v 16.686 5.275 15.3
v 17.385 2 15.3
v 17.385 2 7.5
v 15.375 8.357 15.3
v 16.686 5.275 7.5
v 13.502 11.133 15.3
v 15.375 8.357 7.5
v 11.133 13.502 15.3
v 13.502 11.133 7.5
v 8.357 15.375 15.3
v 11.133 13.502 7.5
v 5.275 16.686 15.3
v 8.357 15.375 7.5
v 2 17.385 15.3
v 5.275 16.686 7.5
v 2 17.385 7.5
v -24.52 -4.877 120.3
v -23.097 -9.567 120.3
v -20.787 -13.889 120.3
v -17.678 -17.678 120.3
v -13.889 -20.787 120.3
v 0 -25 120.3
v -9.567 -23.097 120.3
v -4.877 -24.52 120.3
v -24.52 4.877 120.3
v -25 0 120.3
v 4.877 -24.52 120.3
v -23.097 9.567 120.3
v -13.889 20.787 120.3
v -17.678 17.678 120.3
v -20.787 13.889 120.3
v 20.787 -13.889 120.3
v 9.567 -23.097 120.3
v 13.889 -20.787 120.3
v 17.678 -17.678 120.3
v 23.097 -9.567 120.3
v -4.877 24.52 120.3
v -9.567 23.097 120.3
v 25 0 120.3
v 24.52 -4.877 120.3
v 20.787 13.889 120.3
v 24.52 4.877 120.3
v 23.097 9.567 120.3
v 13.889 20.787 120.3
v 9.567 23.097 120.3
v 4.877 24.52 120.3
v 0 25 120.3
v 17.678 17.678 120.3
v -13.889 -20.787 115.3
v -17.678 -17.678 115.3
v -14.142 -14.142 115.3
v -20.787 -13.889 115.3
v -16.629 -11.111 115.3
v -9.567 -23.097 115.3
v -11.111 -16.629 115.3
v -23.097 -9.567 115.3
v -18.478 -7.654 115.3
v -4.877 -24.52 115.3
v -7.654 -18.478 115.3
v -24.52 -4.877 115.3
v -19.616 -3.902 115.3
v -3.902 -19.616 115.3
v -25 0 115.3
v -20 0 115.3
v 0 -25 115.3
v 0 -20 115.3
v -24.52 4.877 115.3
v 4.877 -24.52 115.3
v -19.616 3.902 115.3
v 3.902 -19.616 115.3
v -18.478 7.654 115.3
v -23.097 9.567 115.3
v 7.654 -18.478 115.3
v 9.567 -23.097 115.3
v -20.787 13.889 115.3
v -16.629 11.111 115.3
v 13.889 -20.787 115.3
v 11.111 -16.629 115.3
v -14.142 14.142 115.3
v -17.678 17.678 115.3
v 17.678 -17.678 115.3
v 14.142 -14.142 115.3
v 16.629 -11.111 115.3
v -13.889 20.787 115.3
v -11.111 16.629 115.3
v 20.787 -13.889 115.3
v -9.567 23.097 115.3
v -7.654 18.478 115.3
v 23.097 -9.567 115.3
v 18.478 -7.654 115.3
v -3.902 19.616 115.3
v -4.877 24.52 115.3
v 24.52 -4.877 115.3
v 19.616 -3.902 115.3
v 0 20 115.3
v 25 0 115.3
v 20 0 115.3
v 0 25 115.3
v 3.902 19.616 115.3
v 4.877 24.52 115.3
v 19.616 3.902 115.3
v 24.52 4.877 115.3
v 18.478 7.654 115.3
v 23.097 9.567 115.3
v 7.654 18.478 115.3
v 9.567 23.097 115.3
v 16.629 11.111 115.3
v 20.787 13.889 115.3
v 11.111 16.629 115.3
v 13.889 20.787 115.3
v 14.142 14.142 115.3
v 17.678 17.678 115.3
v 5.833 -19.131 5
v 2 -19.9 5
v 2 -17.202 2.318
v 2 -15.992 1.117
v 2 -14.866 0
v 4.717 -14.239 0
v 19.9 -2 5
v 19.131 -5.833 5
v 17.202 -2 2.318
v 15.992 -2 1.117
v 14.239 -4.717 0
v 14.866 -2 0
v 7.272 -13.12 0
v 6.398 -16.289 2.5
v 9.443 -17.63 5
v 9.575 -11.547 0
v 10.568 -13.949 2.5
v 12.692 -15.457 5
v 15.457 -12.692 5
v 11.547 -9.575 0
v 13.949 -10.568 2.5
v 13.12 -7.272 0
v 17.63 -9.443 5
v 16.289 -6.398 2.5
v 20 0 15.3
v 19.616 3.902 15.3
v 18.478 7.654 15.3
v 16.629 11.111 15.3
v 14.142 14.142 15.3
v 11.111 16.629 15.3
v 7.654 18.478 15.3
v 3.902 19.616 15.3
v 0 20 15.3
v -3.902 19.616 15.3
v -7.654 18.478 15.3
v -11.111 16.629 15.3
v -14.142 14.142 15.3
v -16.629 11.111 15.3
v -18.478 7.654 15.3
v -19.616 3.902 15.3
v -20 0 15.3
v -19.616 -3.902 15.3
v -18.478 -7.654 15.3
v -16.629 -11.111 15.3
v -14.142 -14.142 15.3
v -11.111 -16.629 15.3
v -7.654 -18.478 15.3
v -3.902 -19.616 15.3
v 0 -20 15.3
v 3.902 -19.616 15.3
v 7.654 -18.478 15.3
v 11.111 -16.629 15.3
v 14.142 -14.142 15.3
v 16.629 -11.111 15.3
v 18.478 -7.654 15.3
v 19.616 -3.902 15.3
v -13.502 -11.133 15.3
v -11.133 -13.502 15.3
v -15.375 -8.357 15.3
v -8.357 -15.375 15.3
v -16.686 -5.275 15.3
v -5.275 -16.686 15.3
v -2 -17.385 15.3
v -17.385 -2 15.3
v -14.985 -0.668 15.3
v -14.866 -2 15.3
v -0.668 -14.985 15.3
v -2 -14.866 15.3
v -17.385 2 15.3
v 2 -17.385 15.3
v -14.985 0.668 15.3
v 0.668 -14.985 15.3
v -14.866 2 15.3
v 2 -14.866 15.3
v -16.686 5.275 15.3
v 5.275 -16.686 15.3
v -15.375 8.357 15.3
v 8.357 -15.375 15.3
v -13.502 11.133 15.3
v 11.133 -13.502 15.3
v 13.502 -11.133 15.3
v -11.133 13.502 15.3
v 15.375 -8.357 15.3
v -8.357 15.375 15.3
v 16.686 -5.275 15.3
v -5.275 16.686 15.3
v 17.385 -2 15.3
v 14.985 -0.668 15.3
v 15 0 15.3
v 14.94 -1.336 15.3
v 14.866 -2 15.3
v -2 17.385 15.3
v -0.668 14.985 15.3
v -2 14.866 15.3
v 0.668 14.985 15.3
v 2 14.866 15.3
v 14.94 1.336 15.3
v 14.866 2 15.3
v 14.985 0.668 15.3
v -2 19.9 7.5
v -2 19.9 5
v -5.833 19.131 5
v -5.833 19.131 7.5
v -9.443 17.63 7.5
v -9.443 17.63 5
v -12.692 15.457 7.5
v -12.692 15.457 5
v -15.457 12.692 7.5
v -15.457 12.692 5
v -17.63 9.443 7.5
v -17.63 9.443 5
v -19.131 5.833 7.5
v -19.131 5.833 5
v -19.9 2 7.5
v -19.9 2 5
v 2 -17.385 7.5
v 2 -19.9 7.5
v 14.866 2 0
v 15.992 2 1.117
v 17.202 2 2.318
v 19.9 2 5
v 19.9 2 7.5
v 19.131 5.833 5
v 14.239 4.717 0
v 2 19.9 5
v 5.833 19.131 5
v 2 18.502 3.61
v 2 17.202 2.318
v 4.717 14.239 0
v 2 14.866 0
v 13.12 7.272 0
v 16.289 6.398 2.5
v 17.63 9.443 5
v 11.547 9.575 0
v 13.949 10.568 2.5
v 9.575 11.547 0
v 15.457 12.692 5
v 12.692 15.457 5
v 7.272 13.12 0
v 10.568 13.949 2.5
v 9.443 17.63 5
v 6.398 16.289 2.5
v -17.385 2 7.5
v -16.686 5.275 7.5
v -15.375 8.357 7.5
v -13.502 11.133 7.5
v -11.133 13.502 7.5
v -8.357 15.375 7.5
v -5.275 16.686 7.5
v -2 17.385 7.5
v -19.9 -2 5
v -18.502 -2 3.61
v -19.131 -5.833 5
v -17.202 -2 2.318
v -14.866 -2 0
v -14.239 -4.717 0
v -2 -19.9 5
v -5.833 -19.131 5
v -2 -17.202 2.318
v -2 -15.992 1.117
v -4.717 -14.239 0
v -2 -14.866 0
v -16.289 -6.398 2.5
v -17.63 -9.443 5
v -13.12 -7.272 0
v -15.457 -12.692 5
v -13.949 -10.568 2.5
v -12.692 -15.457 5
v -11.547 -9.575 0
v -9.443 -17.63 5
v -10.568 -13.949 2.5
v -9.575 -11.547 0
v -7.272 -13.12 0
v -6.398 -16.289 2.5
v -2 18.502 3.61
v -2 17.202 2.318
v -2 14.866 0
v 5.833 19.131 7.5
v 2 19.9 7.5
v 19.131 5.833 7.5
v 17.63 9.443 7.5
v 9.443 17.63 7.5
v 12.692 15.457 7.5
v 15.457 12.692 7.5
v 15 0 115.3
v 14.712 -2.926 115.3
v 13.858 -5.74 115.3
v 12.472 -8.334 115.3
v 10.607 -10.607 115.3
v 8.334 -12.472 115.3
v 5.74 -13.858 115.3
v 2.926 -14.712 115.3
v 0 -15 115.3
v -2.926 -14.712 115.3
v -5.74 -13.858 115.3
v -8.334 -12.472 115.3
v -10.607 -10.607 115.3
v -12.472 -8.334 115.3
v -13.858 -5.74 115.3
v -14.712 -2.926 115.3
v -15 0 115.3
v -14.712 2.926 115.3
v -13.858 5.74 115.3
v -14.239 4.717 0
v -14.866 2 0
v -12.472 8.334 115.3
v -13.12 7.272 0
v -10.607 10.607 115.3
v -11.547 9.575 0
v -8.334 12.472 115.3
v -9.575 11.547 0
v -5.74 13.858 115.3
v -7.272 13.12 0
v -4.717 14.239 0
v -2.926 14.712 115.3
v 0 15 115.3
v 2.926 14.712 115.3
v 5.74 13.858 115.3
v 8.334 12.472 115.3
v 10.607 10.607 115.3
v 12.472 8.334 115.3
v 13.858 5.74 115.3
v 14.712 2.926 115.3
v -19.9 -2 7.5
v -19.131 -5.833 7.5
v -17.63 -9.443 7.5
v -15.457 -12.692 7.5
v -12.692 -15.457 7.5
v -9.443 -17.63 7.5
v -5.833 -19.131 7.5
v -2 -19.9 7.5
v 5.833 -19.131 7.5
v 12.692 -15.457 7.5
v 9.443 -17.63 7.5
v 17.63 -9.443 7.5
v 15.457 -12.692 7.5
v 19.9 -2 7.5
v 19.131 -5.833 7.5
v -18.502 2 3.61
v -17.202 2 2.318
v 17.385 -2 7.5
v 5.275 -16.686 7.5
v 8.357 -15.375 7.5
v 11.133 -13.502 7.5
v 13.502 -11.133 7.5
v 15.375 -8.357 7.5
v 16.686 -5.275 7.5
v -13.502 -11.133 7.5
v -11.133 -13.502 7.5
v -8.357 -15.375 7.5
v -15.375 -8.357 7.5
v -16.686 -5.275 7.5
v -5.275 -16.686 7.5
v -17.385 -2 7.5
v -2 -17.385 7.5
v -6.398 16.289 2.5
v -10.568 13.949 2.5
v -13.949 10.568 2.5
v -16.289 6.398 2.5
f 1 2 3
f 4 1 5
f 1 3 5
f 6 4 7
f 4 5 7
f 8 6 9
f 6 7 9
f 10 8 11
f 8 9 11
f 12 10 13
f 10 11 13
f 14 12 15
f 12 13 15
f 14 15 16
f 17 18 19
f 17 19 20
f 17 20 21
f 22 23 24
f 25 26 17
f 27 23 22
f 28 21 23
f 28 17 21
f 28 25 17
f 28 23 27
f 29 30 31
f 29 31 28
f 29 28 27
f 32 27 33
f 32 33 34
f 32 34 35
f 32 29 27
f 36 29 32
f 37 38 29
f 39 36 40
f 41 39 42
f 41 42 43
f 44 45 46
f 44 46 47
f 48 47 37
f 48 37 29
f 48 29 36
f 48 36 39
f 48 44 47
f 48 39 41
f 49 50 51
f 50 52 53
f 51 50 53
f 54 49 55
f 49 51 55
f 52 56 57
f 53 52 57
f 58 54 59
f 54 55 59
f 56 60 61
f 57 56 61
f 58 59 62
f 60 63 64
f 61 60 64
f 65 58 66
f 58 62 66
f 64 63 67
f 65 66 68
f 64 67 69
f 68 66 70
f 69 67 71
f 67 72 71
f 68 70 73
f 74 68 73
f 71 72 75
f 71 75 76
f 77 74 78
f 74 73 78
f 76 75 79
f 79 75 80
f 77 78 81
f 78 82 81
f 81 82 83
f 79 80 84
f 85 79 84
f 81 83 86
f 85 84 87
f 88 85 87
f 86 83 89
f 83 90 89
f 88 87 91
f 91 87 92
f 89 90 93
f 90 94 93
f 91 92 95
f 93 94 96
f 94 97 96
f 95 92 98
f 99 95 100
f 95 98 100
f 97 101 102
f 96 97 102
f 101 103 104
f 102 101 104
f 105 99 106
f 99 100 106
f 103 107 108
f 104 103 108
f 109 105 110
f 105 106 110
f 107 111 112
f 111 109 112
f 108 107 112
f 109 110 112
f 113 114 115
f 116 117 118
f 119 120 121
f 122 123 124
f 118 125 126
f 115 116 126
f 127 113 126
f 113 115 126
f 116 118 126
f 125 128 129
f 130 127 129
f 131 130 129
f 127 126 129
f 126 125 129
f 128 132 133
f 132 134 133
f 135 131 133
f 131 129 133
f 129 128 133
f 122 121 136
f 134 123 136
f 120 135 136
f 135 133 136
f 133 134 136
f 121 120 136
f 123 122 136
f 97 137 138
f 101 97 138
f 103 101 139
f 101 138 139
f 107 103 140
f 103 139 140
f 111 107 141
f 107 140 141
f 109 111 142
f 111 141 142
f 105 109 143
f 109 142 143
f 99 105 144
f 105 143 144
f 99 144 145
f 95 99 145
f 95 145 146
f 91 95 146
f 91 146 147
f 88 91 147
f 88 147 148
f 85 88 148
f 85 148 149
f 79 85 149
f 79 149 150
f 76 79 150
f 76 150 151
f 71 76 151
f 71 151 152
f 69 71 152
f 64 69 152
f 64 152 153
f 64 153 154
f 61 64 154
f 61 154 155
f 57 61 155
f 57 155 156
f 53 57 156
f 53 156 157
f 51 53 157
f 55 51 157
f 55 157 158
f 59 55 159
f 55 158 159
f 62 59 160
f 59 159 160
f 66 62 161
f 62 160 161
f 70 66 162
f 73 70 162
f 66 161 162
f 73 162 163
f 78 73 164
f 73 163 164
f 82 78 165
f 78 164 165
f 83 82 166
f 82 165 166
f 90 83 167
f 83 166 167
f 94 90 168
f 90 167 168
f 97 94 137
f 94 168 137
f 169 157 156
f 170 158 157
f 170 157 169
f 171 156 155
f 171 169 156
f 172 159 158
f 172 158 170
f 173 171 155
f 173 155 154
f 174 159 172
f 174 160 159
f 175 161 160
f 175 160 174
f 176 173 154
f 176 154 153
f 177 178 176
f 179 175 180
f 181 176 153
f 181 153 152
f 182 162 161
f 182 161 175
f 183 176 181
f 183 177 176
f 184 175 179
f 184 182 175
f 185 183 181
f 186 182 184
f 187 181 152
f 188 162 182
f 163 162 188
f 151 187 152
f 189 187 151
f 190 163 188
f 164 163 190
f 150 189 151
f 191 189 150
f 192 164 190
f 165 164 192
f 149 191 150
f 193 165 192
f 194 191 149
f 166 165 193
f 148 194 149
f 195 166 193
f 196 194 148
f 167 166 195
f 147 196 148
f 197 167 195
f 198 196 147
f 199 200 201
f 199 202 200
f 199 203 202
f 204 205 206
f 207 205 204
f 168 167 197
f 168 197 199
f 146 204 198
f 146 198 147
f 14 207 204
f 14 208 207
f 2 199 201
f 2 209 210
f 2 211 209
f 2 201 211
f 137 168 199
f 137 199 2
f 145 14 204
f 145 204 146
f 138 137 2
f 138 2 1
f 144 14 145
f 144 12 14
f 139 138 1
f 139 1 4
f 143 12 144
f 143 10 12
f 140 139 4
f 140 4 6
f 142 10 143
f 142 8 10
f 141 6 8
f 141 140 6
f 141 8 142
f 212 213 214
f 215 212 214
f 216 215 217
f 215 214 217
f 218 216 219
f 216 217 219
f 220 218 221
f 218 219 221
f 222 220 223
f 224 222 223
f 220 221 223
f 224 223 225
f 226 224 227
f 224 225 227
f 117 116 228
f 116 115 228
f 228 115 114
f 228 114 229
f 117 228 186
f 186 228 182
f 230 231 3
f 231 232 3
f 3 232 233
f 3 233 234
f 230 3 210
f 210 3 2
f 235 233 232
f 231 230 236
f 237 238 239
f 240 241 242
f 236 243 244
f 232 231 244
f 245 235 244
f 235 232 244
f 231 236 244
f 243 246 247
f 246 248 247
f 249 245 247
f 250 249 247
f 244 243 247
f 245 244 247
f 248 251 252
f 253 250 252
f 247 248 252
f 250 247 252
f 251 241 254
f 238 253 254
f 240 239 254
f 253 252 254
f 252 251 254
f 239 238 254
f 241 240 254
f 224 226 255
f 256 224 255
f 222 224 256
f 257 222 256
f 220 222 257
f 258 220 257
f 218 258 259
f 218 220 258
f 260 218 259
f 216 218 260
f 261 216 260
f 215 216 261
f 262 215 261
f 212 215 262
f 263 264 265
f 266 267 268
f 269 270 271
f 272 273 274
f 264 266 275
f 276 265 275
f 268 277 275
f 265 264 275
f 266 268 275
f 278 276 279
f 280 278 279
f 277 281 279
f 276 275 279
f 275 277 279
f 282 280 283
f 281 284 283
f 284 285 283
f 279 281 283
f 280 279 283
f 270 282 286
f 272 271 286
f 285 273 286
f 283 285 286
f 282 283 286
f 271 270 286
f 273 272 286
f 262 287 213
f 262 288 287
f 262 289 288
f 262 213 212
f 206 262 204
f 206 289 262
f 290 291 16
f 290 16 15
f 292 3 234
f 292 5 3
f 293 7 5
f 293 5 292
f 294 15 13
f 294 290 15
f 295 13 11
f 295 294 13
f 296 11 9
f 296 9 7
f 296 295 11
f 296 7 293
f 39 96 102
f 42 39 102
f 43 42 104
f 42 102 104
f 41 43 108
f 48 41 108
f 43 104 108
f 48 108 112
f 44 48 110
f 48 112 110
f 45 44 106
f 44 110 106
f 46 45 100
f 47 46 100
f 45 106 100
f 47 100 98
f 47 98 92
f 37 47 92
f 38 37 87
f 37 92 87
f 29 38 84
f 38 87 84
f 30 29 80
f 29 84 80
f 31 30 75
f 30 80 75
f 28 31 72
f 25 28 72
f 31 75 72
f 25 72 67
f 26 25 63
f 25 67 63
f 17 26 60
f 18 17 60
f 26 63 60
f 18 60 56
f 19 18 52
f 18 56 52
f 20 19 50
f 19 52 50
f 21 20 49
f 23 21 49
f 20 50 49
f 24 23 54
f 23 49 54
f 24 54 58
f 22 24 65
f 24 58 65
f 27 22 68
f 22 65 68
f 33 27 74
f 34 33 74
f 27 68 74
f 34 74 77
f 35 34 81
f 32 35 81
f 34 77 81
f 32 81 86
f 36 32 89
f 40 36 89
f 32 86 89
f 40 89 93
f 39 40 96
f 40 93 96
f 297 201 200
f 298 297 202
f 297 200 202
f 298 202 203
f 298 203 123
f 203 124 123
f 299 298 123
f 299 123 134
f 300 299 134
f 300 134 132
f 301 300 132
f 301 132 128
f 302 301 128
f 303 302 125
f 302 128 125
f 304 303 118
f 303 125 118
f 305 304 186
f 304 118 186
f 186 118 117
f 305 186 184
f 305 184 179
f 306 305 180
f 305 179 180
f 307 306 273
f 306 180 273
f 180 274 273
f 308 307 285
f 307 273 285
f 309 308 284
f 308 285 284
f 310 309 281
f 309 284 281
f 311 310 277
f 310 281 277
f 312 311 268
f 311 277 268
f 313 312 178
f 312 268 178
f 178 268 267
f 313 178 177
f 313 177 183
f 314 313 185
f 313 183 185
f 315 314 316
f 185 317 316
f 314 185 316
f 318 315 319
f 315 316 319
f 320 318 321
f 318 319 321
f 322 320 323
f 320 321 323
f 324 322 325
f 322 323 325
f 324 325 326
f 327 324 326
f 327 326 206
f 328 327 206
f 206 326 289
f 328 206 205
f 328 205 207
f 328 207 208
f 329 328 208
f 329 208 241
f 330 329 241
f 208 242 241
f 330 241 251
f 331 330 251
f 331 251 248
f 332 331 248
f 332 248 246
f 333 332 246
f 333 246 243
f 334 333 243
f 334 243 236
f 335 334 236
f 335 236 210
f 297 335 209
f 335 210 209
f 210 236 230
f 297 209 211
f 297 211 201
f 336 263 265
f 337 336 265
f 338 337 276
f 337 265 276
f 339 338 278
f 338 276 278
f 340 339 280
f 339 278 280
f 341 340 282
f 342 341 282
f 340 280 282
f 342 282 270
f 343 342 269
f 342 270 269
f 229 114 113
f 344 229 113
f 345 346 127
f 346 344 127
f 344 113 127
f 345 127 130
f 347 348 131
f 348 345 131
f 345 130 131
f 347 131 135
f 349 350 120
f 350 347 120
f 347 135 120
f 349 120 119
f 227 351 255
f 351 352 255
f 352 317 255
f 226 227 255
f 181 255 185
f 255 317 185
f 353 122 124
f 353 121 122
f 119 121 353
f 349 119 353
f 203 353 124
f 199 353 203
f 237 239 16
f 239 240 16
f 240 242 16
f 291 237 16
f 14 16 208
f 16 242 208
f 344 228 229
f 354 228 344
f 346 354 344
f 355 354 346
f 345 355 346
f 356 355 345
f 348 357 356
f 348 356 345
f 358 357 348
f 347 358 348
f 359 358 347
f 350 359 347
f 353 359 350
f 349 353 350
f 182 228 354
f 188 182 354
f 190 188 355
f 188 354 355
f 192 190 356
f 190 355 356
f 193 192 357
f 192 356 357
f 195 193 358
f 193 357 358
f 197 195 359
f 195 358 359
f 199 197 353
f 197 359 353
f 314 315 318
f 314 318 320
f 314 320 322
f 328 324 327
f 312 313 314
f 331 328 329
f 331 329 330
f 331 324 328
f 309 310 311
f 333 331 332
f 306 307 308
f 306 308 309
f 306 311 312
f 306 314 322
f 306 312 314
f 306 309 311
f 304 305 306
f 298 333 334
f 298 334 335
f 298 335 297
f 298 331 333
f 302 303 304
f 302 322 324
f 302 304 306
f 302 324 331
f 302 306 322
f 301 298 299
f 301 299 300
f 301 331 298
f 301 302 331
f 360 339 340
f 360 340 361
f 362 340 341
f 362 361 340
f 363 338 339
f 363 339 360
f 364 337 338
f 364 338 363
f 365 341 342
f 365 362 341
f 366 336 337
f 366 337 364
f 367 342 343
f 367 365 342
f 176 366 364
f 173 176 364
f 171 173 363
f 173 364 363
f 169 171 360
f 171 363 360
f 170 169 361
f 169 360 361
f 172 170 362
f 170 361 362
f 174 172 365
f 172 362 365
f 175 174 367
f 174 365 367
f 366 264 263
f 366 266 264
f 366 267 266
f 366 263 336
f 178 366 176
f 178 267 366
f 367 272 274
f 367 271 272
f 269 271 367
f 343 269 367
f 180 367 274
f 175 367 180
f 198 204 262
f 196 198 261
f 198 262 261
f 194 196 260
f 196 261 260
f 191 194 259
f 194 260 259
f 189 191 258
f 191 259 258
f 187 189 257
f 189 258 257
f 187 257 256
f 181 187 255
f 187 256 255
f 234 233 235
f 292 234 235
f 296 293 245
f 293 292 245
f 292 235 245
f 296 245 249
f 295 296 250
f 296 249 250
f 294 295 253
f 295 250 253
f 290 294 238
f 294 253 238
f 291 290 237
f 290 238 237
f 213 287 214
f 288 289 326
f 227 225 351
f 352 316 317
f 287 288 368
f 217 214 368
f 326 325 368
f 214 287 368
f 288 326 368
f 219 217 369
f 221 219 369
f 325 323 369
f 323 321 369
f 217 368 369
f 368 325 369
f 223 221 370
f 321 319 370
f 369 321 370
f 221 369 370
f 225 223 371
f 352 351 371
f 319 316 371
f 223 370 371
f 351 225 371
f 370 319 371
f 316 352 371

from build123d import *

# Parameters (mm, degrees)
F0_R      = 20
F1_DEPTH  = 7.5
F2_R      = 17.5
F3_DEPTH  = 7.8
F4_R      = 20
F5_DEPTH  = 100
F6_R      = 25
F7_DEPTH  = 5
F8_SIZE   = 5
F9_R      = 15
F10_DEPTH = 115.3
F11_W     = 4
F11_H     = 15.3
F12_DEPTH = 25
F13_W     = 4
F13_H     = 15.3
F14_DEPTH = 25


with BuildPart() as f1:
    # F0 (on Top) → F1 (new body)
    with BuildSketch(Plane.XY):
        Circle(F0_R)
    extrude(amount=F1_DEPTH)

    # F2 (on face) → F3 (join)
    with BuildSketch(Plane.XY.offset(7.5)):
        Circle(F2_R)
    extrude(amount=F3_DEPTH)

    # F4 (on face) → F5 (join)
    with BuildSketch(Plane.XY.offset(15.3)):
        Circle(F4_R)
    extrude(amount=F5_DEPTH)

    # F6 (on face) → F7 (join)
    with BuildSketch(Plane.XY.offset(115.3)):
        Circle(F6_R)
    extrude(amount=F7_DEPTH)

    # F8
    f8_edges = [f1.edges().sort_by_distance(p)[0] for p in [
        (-20, 0, 0),
    ]]
    chamfer(f8_edges, length=F8_SIZE)

    # F9 (on face) → F10 (cut, through all)
    with BuildSketch(Plane(origin=(0, 0, 0), x_dir=(1, 0, 0), z_dir=(0, 0, -1))):
        Circle(F9_R)
    extrude(amount=-F10_DEPTH, mode=Mode.SUBTRACT)

    # F11 (on Front) → F12 (cut, symmetric)
    with BuildSketch(Plane.XZ):
        with Locations((0, 7.65)):
            Rectangle(F11_W, F11_H)
    extrude(amount=F12_DEPTH, both=True, mode=Mode.SUBTRACT)

    # F13 (on Right) → F14 (cut, symmetric)
    with BuildSketch(Plane.YZ):
        with Locations((0, 7.65)):
            Rectangle(F13_W, F13_H)
    extrude(amount=F14_DEPTH, both=True, mode=Mode.SUBTRACT)


solid = f1.part
